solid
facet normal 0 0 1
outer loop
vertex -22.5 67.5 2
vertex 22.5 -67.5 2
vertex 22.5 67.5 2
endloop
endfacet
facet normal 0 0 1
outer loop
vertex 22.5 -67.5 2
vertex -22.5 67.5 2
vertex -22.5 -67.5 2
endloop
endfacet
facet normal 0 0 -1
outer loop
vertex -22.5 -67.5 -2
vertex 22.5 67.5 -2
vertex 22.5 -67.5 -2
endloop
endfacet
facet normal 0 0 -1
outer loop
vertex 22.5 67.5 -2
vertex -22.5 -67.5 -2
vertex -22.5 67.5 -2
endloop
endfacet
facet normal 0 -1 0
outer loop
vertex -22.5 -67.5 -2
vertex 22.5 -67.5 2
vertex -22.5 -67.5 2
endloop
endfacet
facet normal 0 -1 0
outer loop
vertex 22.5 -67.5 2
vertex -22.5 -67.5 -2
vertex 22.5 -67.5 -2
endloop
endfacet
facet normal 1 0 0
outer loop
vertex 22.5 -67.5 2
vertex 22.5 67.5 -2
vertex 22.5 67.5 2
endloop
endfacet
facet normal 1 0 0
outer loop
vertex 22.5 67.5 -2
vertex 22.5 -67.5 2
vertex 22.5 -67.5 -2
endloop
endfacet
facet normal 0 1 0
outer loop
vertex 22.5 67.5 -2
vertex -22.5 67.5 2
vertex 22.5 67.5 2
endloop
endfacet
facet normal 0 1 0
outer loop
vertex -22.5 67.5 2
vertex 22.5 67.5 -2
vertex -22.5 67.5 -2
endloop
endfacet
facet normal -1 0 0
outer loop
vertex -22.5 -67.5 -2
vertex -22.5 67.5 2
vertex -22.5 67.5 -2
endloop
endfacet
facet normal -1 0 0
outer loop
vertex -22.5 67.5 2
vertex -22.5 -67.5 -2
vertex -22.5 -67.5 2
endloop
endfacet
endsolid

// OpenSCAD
// ========================================
// a 45 x 135 x 4 mm plate
// NeuroCAD canonical IR; dimensions are millimetres
// ========================================
$fn = 48;

cube(size=[45, 135, 4], center=true);
